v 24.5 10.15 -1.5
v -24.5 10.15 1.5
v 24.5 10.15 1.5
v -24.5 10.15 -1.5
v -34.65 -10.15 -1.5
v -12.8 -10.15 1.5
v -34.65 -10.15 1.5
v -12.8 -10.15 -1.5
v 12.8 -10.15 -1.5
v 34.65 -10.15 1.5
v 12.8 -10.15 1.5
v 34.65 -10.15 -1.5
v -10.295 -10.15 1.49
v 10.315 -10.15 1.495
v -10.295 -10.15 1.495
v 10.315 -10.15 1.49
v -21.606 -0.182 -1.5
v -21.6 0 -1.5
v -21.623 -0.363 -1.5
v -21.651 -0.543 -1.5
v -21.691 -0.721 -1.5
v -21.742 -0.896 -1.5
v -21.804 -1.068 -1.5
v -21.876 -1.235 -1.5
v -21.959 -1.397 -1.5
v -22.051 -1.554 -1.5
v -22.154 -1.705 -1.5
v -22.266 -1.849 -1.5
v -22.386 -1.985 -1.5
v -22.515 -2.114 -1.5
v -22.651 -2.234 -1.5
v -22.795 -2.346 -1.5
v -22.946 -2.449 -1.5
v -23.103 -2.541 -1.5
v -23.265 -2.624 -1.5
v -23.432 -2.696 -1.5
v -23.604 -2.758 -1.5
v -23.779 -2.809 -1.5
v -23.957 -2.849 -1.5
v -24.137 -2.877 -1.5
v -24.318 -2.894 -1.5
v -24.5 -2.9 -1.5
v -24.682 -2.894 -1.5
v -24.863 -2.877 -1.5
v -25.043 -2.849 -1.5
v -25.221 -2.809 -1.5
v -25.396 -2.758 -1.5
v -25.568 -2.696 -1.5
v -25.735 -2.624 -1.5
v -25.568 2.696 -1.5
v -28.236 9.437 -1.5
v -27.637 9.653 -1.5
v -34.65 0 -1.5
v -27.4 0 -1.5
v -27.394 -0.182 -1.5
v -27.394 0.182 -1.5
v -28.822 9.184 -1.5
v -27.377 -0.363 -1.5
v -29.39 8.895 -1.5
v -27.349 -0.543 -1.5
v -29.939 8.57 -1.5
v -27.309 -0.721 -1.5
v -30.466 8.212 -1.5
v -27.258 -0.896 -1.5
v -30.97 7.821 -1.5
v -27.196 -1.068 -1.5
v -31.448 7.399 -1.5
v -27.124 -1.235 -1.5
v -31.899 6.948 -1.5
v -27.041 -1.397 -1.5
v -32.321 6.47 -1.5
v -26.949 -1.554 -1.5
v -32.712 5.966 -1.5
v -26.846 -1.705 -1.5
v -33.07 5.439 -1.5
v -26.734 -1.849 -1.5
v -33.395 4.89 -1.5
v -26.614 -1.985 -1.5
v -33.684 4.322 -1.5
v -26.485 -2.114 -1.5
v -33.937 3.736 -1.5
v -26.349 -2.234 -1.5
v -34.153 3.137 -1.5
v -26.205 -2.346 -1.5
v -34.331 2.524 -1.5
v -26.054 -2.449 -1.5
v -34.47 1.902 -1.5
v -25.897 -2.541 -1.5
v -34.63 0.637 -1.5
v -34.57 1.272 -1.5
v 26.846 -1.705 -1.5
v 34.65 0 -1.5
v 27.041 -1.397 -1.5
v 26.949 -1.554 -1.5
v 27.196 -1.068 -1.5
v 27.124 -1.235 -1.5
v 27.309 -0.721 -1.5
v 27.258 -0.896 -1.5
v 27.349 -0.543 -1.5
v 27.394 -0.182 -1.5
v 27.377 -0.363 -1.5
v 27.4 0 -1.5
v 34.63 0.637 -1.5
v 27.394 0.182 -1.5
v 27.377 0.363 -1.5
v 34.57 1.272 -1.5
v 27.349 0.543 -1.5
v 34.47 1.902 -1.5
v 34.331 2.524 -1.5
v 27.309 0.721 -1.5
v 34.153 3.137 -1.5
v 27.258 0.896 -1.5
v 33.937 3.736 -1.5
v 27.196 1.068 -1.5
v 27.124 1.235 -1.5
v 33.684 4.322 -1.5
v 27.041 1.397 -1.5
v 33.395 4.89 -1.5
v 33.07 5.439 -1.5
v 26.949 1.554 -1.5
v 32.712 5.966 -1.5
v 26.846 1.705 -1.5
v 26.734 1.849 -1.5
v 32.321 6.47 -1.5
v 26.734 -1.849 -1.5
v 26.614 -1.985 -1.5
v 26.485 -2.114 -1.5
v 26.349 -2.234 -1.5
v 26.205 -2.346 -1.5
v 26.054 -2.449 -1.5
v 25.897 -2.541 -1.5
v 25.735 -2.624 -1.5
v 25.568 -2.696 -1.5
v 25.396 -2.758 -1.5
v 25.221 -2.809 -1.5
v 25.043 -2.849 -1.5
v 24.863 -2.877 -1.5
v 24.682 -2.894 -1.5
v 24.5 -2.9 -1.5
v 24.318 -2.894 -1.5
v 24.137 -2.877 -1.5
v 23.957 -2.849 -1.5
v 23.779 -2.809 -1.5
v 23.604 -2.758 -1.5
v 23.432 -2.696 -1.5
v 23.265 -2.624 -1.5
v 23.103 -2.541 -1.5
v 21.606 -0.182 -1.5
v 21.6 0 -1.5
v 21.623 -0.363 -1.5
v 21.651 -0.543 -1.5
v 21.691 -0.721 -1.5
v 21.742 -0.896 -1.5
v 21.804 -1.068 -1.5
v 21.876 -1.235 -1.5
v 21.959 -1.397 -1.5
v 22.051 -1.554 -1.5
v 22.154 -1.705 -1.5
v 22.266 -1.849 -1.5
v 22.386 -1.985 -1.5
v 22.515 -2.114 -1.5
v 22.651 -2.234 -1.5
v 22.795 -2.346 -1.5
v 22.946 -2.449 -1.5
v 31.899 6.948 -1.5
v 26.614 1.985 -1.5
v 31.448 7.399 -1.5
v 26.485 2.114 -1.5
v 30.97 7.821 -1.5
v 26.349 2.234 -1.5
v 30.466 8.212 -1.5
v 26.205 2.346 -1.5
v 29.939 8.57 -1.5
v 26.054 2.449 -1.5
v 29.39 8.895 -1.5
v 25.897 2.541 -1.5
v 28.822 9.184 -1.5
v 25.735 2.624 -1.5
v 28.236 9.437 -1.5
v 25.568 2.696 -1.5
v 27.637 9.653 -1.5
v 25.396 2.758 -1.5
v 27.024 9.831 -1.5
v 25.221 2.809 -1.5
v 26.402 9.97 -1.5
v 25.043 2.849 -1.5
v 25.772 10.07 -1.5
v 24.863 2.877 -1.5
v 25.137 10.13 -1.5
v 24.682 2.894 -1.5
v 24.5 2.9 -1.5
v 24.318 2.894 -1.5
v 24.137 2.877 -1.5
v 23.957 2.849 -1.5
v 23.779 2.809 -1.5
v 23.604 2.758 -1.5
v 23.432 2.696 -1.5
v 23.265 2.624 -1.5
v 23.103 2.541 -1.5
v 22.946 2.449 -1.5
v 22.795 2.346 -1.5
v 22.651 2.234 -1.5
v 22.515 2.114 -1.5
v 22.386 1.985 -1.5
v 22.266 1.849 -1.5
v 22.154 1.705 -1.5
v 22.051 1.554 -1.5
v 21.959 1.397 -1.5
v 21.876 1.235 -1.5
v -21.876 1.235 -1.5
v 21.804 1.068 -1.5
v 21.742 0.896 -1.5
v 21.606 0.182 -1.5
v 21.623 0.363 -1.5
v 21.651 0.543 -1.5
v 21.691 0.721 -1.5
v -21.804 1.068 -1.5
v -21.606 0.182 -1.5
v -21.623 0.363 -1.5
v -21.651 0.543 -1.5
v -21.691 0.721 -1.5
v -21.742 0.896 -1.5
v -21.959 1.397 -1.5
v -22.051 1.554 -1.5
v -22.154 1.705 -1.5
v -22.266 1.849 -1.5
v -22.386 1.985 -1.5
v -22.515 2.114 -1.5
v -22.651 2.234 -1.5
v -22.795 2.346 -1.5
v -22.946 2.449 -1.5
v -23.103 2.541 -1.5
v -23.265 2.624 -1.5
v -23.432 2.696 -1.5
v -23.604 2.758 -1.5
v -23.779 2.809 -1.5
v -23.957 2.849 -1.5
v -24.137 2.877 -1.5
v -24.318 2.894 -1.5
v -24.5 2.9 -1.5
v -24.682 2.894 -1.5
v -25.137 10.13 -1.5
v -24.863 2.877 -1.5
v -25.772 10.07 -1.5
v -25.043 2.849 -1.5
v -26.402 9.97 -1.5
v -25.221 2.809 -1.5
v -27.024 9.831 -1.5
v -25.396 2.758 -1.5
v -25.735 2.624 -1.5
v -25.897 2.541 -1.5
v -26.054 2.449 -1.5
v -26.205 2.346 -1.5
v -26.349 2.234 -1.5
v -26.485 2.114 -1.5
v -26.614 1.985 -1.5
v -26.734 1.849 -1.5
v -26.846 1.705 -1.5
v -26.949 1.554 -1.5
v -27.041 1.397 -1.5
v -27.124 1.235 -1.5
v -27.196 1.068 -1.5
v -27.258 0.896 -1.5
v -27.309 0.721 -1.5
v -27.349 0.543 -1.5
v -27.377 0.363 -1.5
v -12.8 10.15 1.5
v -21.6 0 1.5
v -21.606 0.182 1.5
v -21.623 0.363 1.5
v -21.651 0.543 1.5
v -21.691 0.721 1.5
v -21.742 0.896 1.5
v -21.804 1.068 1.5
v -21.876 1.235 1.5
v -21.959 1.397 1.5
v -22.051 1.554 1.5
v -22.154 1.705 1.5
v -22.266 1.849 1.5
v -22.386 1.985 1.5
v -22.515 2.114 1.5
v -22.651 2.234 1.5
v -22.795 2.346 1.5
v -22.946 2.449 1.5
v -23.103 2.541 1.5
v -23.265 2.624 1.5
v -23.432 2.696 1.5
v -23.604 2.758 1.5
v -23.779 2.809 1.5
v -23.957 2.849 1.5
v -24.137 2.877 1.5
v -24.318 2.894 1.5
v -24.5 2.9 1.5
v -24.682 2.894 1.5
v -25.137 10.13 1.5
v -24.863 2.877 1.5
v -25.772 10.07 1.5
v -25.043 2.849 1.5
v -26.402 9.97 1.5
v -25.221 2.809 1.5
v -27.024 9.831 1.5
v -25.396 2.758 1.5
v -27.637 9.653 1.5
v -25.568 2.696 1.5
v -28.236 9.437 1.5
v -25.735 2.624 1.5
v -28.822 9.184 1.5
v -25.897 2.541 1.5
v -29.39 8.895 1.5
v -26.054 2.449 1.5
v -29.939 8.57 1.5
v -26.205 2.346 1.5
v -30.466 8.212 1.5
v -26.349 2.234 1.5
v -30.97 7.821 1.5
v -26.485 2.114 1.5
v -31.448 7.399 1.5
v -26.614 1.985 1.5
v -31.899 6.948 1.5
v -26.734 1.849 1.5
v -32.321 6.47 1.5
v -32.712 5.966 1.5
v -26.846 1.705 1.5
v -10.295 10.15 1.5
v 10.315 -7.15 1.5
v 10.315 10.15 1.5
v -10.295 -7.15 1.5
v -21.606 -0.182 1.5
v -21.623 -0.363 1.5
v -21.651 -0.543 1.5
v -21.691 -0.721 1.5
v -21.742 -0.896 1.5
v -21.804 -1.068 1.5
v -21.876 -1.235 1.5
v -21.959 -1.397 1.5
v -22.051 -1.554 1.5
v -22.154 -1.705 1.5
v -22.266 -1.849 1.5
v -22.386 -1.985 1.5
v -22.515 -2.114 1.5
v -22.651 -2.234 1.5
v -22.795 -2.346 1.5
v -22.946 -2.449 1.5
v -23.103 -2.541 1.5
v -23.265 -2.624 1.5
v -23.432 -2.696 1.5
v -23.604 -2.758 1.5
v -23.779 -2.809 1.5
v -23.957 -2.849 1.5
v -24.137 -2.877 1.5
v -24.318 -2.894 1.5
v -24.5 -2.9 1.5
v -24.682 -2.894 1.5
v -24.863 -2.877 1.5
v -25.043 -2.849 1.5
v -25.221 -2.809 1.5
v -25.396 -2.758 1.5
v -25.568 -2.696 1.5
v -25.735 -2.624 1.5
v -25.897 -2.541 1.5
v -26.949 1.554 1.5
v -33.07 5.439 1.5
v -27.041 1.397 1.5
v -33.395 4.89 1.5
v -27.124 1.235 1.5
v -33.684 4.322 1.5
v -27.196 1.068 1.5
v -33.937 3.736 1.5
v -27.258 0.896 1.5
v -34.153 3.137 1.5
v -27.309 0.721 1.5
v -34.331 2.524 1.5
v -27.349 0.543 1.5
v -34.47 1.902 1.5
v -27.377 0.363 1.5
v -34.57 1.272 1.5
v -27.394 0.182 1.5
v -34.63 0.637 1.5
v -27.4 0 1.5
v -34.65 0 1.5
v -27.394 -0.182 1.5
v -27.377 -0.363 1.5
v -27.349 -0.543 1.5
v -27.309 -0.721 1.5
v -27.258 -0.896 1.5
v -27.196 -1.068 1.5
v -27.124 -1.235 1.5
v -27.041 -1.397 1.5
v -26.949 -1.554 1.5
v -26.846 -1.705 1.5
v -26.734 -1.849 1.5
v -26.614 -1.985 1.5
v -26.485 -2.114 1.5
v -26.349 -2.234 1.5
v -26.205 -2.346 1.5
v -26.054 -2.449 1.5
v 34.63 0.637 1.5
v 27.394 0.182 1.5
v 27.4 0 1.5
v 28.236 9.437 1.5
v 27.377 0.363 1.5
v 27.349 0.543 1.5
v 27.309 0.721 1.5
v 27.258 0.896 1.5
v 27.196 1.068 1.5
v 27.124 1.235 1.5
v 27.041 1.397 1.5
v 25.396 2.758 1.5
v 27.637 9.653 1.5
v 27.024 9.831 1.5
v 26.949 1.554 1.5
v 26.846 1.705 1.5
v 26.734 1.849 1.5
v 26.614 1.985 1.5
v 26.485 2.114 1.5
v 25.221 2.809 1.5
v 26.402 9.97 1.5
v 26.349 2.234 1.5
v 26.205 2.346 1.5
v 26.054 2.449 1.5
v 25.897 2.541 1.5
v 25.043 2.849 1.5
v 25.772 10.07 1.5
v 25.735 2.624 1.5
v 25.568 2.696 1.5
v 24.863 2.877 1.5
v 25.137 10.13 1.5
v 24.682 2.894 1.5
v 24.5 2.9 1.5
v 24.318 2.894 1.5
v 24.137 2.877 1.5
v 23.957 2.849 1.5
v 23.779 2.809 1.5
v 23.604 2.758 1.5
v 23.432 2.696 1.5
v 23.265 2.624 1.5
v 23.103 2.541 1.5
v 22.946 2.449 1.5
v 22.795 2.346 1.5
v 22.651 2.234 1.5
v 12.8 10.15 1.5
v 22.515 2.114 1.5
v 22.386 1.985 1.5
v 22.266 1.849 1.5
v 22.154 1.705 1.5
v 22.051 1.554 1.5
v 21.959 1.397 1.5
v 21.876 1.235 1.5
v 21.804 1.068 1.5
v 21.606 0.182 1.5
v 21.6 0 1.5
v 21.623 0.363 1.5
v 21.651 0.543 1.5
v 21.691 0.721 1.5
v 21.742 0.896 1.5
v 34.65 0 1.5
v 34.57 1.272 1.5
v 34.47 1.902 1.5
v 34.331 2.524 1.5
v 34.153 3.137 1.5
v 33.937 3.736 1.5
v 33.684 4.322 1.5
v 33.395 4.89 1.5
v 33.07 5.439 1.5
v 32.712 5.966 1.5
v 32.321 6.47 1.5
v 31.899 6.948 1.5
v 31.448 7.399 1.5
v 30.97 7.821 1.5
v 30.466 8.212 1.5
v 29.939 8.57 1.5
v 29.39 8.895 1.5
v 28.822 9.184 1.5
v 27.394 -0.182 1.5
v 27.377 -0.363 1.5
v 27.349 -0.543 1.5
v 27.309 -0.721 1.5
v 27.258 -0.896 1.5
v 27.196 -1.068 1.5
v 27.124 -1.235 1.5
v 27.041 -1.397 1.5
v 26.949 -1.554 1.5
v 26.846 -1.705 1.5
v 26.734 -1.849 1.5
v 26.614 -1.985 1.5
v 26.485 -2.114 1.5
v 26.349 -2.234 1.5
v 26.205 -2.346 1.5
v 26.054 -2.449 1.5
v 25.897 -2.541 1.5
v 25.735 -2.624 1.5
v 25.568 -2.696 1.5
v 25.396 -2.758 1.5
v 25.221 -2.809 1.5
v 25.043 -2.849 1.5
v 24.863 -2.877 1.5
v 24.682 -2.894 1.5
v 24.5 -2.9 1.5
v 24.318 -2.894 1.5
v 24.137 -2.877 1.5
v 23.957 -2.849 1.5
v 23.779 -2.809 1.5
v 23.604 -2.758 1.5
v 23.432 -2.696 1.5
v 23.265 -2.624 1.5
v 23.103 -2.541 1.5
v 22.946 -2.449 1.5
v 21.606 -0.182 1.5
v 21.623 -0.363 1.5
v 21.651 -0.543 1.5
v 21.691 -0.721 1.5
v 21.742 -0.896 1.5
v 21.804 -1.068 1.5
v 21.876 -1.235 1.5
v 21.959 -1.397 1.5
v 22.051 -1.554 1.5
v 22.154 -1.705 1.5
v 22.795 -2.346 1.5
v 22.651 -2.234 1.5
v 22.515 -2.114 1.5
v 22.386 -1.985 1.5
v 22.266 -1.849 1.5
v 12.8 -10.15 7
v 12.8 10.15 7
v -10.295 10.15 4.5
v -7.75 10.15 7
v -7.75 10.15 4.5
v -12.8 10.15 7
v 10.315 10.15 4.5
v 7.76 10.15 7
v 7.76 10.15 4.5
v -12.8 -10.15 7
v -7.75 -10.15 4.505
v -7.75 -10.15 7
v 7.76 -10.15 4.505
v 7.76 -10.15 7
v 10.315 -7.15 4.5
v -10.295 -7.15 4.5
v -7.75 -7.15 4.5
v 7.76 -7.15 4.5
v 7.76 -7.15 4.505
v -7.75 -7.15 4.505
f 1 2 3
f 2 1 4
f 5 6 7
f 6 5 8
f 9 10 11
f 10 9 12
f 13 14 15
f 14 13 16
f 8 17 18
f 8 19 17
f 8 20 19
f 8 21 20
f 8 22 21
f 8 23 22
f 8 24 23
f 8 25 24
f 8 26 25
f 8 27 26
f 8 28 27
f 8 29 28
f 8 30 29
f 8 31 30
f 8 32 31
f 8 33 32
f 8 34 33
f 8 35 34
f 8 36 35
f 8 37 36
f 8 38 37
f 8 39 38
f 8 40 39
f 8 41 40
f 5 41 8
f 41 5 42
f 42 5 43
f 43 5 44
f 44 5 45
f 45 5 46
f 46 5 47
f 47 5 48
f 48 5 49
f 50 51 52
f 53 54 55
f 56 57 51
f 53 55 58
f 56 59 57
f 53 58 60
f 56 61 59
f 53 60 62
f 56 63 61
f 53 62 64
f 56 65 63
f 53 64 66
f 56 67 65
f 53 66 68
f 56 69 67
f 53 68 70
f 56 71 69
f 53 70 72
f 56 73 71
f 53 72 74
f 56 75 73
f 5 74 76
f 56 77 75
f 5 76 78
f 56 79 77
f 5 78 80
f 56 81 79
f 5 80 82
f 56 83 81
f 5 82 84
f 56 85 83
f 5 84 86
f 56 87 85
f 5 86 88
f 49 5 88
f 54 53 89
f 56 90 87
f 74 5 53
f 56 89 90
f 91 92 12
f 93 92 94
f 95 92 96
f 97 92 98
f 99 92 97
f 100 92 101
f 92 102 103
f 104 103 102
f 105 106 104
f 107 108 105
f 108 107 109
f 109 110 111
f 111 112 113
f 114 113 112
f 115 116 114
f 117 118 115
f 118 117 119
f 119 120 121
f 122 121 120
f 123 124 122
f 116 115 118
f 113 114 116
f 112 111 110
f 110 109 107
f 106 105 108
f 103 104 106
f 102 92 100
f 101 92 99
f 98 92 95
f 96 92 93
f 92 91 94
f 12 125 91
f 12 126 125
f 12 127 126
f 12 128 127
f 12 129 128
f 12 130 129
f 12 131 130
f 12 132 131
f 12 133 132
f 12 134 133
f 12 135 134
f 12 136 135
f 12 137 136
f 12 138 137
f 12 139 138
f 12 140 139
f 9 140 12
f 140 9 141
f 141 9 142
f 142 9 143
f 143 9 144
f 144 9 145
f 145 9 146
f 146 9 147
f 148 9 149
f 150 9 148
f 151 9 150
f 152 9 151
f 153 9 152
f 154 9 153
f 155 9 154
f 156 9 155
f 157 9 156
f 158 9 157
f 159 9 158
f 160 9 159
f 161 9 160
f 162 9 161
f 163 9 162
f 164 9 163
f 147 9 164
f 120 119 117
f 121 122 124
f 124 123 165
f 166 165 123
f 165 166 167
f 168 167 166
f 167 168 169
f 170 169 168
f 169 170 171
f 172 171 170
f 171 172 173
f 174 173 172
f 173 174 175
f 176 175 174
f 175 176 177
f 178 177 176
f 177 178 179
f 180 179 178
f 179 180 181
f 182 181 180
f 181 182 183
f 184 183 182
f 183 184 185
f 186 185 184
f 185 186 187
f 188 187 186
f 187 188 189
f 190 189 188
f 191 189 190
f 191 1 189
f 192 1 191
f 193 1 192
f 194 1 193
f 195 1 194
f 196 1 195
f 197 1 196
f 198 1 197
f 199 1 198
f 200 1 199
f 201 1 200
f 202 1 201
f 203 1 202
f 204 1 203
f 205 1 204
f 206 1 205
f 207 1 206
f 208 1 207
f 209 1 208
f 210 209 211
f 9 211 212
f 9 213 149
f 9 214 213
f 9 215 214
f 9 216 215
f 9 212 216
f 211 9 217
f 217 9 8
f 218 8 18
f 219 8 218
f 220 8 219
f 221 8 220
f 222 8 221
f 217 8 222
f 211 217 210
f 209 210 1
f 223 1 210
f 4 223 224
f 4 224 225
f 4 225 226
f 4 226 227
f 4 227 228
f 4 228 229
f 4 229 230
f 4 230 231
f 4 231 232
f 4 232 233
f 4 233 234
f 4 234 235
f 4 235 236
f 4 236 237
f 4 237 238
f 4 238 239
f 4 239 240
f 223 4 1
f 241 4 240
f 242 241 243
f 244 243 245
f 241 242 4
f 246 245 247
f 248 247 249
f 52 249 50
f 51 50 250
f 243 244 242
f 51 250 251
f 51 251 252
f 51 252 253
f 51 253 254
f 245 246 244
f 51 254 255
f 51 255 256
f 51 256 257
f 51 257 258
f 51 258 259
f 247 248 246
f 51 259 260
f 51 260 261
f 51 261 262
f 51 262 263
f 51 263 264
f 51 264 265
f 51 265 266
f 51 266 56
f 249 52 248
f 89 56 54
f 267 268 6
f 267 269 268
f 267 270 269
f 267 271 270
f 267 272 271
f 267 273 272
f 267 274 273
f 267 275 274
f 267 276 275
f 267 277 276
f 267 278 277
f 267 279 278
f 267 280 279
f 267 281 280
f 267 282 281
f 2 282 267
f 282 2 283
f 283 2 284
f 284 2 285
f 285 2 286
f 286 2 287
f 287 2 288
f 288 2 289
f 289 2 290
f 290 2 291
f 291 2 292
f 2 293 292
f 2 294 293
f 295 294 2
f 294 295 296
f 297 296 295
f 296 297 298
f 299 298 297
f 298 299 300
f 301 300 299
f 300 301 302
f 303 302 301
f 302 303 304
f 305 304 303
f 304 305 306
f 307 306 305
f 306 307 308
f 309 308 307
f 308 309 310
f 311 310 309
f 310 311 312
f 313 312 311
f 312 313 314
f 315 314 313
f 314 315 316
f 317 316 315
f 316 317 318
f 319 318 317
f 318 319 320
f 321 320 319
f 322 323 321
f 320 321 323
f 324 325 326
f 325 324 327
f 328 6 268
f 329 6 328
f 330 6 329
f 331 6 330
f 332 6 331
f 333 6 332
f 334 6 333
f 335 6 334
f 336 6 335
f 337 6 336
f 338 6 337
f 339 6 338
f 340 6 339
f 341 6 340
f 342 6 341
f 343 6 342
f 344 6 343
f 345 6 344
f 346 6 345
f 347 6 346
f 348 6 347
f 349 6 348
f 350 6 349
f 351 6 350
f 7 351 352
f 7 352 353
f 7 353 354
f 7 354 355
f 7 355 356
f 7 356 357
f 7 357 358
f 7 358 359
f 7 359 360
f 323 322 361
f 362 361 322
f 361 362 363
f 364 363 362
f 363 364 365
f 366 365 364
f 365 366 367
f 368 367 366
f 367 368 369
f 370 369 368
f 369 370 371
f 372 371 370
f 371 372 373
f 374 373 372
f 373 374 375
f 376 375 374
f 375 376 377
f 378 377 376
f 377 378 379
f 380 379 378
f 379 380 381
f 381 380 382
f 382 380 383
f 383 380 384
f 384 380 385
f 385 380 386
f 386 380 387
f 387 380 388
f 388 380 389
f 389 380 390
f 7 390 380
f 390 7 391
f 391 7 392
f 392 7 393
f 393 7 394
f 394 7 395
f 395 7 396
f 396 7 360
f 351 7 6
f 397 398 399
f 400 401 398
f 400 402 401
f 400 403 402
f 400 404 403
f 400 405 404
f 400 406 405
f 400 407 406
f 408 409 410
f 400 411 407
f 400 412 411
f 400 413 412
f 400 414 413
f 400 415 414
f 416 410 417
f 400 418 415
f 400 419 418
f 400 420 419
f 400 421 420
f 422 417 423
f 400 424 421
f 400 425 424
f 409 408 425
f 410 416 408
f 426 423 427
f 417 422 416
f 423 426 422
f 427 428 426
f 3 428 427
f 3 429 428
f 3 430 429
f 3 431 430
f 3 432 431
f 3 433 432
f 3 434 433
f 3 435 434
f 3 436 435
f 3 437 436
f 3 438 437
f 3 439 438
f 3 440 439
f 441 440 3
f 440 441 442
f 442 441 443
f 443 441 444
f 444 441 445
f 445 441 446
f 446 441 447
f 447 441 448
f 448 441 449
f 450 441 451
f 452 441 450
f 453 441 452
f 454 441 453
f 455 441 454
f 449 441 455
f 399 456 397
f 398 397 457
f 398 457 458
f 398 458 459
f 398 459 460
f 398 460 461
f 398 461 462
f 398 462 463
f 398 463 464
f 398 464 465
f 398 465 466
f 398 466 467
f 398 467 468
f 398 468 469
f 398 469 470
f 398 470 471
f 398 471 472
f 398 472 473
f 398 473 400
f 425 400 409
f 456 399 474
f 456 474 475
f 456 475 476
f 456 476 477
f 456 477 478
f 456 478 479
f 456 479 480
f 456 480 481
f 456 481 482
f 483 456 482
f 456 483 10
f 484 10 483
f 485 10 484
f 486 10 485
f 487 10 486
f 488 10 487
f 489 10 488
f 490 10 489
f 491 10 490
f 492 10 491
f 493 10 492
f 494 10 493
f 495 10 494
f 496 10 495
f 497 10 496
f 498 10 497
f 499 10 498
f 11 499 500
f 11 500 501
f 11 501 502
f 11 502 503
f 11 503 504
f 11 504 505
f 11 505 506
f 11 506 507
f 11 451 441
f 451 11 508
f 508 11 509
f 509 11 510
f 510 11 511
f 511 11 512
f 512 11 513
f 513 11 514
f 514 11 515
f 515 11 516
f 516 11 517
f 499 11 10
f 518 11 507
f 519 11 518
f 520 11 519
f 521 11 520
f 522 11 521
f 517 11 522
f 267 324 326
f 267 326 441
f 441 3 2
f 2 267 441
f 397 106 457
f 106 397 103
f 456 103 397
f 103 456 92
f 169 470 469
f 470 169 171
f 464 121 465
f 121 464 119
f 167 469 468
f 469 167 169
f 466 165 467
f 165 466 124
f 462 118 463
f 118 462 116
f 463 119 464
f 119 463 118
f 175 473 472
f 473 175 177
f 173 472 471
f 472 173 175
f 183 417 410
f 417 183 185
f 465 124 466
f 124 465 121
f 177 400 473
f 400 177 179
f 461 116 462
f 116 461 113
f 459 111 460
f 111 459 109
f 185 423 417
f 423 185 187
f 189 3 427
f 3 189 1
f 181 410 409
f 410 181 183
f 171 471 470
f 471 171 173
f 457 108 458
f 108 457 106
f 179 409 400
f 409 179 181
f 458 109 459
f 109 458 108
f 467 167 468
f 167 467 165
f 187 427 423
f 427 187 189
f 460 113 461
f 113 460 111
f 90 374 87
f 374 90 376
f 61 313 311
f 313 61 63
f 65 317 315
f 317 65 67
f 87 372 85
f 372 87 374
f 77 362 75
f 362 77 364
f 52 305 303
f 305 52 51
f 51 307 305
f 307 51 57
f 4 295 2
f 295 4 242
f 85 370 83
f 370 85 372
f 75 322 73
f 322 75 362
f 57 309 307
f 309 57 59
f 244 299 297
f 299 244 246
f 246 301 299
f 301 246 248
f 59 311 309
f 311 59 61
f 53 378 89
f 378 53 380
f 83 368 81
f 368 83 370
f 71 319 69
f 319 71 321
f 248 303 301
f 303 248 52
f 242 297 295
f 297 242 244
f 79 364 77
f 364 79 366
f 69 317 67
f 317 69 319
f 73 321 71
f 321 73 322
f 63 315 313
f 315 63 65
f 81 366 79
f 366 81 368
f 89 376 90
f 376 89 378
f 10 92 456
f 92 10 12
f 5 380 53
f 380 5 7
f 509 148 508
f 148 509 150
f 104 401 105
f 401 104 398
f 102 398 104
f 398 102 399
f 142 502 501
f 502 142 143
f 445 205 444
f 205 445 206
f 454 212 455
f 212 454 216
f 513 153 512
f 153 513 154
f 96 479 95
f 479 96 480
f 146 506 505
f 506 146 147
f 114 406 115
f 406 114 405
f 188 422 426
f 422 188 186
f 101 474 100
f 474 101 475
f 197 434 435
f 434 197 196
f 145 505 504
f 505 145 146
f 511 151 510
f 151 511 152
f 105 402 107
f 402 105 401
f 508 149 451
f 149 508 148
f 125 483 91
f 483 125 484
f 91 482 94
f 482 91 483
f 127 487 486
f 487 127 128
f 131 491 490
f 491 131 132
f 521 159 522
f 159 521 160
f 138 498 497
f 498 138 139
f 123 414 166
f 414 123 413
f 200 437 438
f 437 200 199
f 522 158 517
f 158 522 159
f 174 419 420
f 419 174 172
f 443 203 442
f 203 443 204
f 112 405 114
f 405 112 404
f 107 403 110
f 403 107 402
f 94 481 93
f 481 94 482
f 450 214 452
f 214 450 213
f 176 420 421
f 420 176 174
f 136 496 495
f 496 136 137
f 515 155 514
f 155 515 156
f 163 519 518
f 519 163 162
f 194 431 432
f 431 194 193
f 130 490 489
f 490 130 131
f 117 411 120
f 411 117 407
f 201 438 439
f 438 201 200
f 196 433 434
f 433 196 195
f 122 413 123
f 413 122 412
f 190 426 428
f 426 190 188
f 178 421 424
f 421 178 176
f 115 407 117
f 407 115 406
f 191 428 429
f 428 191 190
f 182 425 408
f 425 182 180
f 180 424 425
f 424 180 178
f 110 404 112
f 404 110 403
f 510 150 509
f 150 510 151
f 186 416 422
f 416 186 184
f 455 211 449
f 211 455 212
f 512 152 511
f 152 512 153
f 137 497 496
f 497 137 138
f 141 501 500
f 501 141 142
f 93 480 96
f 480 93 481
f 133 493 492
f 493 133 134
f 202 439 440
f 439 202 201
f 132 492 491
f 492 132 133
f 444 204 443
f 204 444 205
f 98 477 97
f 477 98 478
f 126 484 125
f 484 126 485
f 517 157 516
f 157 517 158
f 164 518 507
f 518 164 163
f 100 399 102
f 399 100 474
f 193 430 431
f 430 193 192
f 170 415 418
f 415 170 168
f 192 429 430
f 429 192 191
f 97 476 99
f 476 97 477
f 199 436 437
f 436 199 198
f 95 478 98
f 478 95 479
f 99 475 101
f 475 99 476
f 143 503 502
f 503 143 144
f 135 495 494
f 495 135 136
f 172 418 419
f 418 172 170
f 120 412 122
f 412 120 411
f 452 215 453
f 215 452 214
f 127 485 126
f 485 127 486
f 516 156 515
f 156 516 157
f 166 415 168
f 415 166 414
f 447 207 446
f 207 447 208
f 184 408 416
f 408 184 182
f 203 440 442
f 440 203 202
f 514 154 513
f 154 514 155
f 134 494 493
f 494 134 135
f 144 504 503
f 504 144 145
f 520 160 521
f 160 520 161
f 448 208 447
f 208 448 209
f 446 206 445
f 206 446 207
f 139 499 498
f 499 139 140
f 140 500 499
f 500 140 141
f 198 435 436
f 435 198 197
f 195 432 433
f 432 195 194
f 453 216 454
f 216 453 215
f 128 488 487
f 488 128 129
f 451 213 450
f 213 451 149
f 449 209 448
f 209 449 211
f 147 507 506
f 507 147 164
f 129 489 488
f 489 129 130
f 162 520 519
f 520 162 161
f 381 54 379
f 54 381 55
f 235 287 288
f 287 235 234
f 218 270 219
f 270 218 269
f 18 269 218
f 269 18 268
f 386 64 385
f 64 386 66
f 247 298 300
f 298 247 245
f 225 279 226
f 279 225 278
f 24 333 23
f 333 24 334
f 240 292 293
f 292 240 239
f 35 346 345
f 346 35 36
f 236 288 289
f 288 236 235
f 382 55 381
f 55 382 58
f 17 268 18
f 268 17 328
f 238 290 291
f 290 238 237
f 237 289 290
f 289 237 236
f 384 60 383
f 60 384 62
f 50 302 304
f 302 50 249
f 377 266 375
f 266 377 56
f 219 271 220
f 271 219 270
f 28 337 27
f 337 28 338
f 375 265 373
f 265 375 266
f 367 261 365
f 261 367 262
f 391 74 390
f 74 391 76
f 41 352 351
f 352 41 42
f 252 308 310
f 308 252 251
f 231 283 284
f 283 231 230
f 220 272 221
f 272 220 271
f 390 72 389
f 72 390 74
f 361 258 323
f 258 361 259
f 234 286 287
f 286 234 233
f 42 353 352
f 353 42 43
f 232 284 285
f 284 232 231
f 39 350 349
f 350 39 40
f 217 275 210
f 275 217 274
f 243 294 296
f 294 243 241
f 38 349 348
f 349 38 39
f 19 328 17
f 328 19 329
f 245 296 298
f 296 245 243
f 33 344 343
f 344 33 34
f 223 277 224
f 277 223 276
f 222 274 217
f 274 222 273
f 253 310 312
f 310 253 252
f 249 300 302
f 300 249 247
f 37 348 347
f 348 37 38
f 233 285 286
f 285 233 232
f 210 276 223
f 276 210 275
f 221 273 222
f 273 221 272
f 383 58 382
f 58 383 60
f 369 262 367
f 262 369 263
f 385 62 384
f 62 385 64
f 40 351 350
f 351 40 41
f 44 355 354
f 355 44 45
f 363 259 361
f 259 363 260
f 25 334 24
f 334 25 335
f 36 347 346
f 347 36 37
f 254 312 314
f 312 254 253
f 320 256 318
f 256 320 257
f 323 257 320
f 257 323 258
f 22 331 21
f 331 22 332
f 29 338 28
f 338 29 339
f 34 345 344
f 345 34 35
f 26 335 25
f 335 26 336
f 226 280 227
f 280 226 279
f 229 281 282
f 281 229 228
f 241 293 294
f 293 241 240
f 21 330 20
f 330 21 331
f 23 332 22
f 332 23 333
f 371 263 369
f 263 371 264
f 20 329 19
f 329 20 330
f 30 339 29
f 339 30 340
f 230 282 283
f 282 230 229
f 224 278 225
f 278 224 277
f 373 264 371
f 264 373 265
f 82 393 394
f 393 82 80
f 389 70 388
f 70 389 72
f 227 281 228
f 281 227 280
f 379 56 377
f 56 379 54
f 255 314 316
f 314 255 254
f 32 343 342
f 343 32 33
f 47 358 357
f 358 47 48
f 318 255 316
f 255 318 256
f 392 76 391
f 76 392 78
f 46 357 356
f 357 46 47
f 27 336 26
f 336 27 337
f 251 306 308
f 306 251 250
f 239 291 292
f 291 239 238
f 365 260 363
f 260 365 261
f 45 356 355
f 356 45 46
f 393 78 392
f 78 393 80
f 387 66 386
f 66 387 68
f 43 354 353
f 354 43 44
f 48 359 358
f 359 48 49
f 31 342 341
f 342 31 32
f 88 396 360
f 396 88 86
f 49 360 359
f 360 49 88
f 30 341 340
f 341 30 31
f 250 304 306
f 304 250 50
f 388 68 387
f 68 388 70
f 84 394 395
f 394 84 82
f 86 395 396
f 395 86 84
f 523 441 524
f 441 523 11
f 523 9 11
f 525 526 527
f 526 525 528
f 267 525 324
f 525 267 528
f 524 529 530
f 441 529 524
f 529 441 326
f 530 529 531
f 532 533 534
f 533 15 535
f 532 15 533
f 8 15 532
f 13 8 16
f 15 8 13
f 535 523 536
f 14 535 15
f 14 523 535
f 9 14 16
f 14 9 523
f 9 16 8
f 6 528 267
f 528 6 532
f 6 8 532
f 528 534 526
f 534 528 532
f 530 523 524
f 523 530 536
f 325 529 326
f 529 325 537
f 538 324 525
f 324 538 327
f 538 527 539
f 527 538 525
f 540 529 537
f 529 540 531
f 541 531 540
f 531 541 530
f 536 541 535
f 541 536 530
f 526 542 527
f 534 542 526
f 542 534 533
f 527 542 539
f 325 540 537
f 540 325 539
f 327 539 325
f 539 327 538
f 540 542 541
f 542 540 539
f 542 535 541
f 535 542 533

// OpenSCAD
/*

Topeak Bike Rack License Plate to Tail Light Mount Adaptor v0.9
Rob Meyer
Oct 21, 2015

Modified from http://www.thingiverse.com/thing:8947/
Adapter for bike light to rack
Gian Pablo Villamil
May 30, 2011

Topeak bike rack license plate mount:
	Total width: 59.0mm
	Total height: 14.50mm
	center-to-center hole distance: 50.0mm
	rounded corner radius: 

Standard chinese tail light slide track:
	inside groove width: 20.6mm
	outside groove width: 15.5mm
	track height:
	wall thickness: 

*/
$fn = 100;
overlap = 0.01; // negligible amount necessary to make unions and differences render properly

bracket_height = 20.3;
tongue_width = 20.6;
tongue_thickness = 3;
base_width = 15.5; // How large the "outside" groove track is. Should be less than tongue_width by 2x the desired wall thickness
base_thickness = 2.5;
side_thickness = 2.5;

plate_thickness = 3;
plate_width = 100;
plate_height = bracket_height;

hole_dia = 5.8 ;
hole_sep = 49.0 ; // Topeak

module plate() {
	difference() {
		union() {
			cube(size= [hole_sep, plate_thickness, plate_height], center = true);
			translate ([hole_sep/2,0,0]) rotate (a = 90, v = [1,0,0]) 
				cylinder(h = plate_thickness, r = plate_height/2, center = true);
			translate ([-hole_sep/2,0,0]) rotate (a = 90, v = [1,0,0]) 
				cylinder(h = plate_thickness, r = plate_height/2, center = true);
			translate ([hole_sep/2+plate_height/4,0,-plate_height/4])
				cube(size = [plate_height/2,plate_thickness,plate_height/2],center = true);
			translate ([-(hole_sep/2+plate_height/4),0,-plate_height/4])
				cube(size = [plate_height/2,plate_thickness,plate_height/2],center = true);

		}
		translate ([hole_sep/2,0,0]) rotate (a = 90, v = [1,0,0]) 
			cylinder(h = plate_thickness+2, r = hole_dia/2, center = true);
		translate ([-hole_sep/2,0,0]) rotate (a = 90, v = [1,0,0]) 
			cylinder(h = plate_thickness+2, r = hole_dia/2, center = true);
	};
};

module bracket() {
	union() {
		difference(){
			translate([-(tongue_width+(side_thickness *2))/2,0,0])
				cube(size = [tongue_width+(side_thickness * 2),plate_thickness+tongue_thickness+base_thickness, bracket_height], center = false);
			translate([-tongue_width/2+overlap/2,2.5,-overlap/2])
				cube(size = [tongue_width+overlap, tongue_thickness+overlap, bracket_height+overlap], center=false);
			translate([-base_width/2,-overlap/2,-overlap/2])
				cube(size = [base_width+overlap, base_thickness+overlap, bracket_height+overlap], center=false);
		};

		translate([-tongue_width/2-overlap/2, base_thickness-overlap/2, 0])
			cube(size = [tongue_width+overlap*2, plate_thickness+overlap, plate_thickness], center=false);
	};
};

module release() {
	union() {
		translate([-3.5,-plate_thickness/2,0])
		#cube(size = [7, plate_thickness, 10], center = false);
		translate([0,-1.25,10]) rotate(a = 45, v = [1,0,0])
		cube(size = [4,2,2], center = true);
		translate([0,plate_thickness/2,12]) rotate(a = 90, v = [1,0,0])
		cylinder(h = plate_thickness, r = 6);
	};
}

rotate(a=90, v=[-1,0,0])
{
	union()
	{
		plate();
		translate([0,-7,-plate_height/2])
			bracket();
	}
}
//translate([0,0,10])
//release();
